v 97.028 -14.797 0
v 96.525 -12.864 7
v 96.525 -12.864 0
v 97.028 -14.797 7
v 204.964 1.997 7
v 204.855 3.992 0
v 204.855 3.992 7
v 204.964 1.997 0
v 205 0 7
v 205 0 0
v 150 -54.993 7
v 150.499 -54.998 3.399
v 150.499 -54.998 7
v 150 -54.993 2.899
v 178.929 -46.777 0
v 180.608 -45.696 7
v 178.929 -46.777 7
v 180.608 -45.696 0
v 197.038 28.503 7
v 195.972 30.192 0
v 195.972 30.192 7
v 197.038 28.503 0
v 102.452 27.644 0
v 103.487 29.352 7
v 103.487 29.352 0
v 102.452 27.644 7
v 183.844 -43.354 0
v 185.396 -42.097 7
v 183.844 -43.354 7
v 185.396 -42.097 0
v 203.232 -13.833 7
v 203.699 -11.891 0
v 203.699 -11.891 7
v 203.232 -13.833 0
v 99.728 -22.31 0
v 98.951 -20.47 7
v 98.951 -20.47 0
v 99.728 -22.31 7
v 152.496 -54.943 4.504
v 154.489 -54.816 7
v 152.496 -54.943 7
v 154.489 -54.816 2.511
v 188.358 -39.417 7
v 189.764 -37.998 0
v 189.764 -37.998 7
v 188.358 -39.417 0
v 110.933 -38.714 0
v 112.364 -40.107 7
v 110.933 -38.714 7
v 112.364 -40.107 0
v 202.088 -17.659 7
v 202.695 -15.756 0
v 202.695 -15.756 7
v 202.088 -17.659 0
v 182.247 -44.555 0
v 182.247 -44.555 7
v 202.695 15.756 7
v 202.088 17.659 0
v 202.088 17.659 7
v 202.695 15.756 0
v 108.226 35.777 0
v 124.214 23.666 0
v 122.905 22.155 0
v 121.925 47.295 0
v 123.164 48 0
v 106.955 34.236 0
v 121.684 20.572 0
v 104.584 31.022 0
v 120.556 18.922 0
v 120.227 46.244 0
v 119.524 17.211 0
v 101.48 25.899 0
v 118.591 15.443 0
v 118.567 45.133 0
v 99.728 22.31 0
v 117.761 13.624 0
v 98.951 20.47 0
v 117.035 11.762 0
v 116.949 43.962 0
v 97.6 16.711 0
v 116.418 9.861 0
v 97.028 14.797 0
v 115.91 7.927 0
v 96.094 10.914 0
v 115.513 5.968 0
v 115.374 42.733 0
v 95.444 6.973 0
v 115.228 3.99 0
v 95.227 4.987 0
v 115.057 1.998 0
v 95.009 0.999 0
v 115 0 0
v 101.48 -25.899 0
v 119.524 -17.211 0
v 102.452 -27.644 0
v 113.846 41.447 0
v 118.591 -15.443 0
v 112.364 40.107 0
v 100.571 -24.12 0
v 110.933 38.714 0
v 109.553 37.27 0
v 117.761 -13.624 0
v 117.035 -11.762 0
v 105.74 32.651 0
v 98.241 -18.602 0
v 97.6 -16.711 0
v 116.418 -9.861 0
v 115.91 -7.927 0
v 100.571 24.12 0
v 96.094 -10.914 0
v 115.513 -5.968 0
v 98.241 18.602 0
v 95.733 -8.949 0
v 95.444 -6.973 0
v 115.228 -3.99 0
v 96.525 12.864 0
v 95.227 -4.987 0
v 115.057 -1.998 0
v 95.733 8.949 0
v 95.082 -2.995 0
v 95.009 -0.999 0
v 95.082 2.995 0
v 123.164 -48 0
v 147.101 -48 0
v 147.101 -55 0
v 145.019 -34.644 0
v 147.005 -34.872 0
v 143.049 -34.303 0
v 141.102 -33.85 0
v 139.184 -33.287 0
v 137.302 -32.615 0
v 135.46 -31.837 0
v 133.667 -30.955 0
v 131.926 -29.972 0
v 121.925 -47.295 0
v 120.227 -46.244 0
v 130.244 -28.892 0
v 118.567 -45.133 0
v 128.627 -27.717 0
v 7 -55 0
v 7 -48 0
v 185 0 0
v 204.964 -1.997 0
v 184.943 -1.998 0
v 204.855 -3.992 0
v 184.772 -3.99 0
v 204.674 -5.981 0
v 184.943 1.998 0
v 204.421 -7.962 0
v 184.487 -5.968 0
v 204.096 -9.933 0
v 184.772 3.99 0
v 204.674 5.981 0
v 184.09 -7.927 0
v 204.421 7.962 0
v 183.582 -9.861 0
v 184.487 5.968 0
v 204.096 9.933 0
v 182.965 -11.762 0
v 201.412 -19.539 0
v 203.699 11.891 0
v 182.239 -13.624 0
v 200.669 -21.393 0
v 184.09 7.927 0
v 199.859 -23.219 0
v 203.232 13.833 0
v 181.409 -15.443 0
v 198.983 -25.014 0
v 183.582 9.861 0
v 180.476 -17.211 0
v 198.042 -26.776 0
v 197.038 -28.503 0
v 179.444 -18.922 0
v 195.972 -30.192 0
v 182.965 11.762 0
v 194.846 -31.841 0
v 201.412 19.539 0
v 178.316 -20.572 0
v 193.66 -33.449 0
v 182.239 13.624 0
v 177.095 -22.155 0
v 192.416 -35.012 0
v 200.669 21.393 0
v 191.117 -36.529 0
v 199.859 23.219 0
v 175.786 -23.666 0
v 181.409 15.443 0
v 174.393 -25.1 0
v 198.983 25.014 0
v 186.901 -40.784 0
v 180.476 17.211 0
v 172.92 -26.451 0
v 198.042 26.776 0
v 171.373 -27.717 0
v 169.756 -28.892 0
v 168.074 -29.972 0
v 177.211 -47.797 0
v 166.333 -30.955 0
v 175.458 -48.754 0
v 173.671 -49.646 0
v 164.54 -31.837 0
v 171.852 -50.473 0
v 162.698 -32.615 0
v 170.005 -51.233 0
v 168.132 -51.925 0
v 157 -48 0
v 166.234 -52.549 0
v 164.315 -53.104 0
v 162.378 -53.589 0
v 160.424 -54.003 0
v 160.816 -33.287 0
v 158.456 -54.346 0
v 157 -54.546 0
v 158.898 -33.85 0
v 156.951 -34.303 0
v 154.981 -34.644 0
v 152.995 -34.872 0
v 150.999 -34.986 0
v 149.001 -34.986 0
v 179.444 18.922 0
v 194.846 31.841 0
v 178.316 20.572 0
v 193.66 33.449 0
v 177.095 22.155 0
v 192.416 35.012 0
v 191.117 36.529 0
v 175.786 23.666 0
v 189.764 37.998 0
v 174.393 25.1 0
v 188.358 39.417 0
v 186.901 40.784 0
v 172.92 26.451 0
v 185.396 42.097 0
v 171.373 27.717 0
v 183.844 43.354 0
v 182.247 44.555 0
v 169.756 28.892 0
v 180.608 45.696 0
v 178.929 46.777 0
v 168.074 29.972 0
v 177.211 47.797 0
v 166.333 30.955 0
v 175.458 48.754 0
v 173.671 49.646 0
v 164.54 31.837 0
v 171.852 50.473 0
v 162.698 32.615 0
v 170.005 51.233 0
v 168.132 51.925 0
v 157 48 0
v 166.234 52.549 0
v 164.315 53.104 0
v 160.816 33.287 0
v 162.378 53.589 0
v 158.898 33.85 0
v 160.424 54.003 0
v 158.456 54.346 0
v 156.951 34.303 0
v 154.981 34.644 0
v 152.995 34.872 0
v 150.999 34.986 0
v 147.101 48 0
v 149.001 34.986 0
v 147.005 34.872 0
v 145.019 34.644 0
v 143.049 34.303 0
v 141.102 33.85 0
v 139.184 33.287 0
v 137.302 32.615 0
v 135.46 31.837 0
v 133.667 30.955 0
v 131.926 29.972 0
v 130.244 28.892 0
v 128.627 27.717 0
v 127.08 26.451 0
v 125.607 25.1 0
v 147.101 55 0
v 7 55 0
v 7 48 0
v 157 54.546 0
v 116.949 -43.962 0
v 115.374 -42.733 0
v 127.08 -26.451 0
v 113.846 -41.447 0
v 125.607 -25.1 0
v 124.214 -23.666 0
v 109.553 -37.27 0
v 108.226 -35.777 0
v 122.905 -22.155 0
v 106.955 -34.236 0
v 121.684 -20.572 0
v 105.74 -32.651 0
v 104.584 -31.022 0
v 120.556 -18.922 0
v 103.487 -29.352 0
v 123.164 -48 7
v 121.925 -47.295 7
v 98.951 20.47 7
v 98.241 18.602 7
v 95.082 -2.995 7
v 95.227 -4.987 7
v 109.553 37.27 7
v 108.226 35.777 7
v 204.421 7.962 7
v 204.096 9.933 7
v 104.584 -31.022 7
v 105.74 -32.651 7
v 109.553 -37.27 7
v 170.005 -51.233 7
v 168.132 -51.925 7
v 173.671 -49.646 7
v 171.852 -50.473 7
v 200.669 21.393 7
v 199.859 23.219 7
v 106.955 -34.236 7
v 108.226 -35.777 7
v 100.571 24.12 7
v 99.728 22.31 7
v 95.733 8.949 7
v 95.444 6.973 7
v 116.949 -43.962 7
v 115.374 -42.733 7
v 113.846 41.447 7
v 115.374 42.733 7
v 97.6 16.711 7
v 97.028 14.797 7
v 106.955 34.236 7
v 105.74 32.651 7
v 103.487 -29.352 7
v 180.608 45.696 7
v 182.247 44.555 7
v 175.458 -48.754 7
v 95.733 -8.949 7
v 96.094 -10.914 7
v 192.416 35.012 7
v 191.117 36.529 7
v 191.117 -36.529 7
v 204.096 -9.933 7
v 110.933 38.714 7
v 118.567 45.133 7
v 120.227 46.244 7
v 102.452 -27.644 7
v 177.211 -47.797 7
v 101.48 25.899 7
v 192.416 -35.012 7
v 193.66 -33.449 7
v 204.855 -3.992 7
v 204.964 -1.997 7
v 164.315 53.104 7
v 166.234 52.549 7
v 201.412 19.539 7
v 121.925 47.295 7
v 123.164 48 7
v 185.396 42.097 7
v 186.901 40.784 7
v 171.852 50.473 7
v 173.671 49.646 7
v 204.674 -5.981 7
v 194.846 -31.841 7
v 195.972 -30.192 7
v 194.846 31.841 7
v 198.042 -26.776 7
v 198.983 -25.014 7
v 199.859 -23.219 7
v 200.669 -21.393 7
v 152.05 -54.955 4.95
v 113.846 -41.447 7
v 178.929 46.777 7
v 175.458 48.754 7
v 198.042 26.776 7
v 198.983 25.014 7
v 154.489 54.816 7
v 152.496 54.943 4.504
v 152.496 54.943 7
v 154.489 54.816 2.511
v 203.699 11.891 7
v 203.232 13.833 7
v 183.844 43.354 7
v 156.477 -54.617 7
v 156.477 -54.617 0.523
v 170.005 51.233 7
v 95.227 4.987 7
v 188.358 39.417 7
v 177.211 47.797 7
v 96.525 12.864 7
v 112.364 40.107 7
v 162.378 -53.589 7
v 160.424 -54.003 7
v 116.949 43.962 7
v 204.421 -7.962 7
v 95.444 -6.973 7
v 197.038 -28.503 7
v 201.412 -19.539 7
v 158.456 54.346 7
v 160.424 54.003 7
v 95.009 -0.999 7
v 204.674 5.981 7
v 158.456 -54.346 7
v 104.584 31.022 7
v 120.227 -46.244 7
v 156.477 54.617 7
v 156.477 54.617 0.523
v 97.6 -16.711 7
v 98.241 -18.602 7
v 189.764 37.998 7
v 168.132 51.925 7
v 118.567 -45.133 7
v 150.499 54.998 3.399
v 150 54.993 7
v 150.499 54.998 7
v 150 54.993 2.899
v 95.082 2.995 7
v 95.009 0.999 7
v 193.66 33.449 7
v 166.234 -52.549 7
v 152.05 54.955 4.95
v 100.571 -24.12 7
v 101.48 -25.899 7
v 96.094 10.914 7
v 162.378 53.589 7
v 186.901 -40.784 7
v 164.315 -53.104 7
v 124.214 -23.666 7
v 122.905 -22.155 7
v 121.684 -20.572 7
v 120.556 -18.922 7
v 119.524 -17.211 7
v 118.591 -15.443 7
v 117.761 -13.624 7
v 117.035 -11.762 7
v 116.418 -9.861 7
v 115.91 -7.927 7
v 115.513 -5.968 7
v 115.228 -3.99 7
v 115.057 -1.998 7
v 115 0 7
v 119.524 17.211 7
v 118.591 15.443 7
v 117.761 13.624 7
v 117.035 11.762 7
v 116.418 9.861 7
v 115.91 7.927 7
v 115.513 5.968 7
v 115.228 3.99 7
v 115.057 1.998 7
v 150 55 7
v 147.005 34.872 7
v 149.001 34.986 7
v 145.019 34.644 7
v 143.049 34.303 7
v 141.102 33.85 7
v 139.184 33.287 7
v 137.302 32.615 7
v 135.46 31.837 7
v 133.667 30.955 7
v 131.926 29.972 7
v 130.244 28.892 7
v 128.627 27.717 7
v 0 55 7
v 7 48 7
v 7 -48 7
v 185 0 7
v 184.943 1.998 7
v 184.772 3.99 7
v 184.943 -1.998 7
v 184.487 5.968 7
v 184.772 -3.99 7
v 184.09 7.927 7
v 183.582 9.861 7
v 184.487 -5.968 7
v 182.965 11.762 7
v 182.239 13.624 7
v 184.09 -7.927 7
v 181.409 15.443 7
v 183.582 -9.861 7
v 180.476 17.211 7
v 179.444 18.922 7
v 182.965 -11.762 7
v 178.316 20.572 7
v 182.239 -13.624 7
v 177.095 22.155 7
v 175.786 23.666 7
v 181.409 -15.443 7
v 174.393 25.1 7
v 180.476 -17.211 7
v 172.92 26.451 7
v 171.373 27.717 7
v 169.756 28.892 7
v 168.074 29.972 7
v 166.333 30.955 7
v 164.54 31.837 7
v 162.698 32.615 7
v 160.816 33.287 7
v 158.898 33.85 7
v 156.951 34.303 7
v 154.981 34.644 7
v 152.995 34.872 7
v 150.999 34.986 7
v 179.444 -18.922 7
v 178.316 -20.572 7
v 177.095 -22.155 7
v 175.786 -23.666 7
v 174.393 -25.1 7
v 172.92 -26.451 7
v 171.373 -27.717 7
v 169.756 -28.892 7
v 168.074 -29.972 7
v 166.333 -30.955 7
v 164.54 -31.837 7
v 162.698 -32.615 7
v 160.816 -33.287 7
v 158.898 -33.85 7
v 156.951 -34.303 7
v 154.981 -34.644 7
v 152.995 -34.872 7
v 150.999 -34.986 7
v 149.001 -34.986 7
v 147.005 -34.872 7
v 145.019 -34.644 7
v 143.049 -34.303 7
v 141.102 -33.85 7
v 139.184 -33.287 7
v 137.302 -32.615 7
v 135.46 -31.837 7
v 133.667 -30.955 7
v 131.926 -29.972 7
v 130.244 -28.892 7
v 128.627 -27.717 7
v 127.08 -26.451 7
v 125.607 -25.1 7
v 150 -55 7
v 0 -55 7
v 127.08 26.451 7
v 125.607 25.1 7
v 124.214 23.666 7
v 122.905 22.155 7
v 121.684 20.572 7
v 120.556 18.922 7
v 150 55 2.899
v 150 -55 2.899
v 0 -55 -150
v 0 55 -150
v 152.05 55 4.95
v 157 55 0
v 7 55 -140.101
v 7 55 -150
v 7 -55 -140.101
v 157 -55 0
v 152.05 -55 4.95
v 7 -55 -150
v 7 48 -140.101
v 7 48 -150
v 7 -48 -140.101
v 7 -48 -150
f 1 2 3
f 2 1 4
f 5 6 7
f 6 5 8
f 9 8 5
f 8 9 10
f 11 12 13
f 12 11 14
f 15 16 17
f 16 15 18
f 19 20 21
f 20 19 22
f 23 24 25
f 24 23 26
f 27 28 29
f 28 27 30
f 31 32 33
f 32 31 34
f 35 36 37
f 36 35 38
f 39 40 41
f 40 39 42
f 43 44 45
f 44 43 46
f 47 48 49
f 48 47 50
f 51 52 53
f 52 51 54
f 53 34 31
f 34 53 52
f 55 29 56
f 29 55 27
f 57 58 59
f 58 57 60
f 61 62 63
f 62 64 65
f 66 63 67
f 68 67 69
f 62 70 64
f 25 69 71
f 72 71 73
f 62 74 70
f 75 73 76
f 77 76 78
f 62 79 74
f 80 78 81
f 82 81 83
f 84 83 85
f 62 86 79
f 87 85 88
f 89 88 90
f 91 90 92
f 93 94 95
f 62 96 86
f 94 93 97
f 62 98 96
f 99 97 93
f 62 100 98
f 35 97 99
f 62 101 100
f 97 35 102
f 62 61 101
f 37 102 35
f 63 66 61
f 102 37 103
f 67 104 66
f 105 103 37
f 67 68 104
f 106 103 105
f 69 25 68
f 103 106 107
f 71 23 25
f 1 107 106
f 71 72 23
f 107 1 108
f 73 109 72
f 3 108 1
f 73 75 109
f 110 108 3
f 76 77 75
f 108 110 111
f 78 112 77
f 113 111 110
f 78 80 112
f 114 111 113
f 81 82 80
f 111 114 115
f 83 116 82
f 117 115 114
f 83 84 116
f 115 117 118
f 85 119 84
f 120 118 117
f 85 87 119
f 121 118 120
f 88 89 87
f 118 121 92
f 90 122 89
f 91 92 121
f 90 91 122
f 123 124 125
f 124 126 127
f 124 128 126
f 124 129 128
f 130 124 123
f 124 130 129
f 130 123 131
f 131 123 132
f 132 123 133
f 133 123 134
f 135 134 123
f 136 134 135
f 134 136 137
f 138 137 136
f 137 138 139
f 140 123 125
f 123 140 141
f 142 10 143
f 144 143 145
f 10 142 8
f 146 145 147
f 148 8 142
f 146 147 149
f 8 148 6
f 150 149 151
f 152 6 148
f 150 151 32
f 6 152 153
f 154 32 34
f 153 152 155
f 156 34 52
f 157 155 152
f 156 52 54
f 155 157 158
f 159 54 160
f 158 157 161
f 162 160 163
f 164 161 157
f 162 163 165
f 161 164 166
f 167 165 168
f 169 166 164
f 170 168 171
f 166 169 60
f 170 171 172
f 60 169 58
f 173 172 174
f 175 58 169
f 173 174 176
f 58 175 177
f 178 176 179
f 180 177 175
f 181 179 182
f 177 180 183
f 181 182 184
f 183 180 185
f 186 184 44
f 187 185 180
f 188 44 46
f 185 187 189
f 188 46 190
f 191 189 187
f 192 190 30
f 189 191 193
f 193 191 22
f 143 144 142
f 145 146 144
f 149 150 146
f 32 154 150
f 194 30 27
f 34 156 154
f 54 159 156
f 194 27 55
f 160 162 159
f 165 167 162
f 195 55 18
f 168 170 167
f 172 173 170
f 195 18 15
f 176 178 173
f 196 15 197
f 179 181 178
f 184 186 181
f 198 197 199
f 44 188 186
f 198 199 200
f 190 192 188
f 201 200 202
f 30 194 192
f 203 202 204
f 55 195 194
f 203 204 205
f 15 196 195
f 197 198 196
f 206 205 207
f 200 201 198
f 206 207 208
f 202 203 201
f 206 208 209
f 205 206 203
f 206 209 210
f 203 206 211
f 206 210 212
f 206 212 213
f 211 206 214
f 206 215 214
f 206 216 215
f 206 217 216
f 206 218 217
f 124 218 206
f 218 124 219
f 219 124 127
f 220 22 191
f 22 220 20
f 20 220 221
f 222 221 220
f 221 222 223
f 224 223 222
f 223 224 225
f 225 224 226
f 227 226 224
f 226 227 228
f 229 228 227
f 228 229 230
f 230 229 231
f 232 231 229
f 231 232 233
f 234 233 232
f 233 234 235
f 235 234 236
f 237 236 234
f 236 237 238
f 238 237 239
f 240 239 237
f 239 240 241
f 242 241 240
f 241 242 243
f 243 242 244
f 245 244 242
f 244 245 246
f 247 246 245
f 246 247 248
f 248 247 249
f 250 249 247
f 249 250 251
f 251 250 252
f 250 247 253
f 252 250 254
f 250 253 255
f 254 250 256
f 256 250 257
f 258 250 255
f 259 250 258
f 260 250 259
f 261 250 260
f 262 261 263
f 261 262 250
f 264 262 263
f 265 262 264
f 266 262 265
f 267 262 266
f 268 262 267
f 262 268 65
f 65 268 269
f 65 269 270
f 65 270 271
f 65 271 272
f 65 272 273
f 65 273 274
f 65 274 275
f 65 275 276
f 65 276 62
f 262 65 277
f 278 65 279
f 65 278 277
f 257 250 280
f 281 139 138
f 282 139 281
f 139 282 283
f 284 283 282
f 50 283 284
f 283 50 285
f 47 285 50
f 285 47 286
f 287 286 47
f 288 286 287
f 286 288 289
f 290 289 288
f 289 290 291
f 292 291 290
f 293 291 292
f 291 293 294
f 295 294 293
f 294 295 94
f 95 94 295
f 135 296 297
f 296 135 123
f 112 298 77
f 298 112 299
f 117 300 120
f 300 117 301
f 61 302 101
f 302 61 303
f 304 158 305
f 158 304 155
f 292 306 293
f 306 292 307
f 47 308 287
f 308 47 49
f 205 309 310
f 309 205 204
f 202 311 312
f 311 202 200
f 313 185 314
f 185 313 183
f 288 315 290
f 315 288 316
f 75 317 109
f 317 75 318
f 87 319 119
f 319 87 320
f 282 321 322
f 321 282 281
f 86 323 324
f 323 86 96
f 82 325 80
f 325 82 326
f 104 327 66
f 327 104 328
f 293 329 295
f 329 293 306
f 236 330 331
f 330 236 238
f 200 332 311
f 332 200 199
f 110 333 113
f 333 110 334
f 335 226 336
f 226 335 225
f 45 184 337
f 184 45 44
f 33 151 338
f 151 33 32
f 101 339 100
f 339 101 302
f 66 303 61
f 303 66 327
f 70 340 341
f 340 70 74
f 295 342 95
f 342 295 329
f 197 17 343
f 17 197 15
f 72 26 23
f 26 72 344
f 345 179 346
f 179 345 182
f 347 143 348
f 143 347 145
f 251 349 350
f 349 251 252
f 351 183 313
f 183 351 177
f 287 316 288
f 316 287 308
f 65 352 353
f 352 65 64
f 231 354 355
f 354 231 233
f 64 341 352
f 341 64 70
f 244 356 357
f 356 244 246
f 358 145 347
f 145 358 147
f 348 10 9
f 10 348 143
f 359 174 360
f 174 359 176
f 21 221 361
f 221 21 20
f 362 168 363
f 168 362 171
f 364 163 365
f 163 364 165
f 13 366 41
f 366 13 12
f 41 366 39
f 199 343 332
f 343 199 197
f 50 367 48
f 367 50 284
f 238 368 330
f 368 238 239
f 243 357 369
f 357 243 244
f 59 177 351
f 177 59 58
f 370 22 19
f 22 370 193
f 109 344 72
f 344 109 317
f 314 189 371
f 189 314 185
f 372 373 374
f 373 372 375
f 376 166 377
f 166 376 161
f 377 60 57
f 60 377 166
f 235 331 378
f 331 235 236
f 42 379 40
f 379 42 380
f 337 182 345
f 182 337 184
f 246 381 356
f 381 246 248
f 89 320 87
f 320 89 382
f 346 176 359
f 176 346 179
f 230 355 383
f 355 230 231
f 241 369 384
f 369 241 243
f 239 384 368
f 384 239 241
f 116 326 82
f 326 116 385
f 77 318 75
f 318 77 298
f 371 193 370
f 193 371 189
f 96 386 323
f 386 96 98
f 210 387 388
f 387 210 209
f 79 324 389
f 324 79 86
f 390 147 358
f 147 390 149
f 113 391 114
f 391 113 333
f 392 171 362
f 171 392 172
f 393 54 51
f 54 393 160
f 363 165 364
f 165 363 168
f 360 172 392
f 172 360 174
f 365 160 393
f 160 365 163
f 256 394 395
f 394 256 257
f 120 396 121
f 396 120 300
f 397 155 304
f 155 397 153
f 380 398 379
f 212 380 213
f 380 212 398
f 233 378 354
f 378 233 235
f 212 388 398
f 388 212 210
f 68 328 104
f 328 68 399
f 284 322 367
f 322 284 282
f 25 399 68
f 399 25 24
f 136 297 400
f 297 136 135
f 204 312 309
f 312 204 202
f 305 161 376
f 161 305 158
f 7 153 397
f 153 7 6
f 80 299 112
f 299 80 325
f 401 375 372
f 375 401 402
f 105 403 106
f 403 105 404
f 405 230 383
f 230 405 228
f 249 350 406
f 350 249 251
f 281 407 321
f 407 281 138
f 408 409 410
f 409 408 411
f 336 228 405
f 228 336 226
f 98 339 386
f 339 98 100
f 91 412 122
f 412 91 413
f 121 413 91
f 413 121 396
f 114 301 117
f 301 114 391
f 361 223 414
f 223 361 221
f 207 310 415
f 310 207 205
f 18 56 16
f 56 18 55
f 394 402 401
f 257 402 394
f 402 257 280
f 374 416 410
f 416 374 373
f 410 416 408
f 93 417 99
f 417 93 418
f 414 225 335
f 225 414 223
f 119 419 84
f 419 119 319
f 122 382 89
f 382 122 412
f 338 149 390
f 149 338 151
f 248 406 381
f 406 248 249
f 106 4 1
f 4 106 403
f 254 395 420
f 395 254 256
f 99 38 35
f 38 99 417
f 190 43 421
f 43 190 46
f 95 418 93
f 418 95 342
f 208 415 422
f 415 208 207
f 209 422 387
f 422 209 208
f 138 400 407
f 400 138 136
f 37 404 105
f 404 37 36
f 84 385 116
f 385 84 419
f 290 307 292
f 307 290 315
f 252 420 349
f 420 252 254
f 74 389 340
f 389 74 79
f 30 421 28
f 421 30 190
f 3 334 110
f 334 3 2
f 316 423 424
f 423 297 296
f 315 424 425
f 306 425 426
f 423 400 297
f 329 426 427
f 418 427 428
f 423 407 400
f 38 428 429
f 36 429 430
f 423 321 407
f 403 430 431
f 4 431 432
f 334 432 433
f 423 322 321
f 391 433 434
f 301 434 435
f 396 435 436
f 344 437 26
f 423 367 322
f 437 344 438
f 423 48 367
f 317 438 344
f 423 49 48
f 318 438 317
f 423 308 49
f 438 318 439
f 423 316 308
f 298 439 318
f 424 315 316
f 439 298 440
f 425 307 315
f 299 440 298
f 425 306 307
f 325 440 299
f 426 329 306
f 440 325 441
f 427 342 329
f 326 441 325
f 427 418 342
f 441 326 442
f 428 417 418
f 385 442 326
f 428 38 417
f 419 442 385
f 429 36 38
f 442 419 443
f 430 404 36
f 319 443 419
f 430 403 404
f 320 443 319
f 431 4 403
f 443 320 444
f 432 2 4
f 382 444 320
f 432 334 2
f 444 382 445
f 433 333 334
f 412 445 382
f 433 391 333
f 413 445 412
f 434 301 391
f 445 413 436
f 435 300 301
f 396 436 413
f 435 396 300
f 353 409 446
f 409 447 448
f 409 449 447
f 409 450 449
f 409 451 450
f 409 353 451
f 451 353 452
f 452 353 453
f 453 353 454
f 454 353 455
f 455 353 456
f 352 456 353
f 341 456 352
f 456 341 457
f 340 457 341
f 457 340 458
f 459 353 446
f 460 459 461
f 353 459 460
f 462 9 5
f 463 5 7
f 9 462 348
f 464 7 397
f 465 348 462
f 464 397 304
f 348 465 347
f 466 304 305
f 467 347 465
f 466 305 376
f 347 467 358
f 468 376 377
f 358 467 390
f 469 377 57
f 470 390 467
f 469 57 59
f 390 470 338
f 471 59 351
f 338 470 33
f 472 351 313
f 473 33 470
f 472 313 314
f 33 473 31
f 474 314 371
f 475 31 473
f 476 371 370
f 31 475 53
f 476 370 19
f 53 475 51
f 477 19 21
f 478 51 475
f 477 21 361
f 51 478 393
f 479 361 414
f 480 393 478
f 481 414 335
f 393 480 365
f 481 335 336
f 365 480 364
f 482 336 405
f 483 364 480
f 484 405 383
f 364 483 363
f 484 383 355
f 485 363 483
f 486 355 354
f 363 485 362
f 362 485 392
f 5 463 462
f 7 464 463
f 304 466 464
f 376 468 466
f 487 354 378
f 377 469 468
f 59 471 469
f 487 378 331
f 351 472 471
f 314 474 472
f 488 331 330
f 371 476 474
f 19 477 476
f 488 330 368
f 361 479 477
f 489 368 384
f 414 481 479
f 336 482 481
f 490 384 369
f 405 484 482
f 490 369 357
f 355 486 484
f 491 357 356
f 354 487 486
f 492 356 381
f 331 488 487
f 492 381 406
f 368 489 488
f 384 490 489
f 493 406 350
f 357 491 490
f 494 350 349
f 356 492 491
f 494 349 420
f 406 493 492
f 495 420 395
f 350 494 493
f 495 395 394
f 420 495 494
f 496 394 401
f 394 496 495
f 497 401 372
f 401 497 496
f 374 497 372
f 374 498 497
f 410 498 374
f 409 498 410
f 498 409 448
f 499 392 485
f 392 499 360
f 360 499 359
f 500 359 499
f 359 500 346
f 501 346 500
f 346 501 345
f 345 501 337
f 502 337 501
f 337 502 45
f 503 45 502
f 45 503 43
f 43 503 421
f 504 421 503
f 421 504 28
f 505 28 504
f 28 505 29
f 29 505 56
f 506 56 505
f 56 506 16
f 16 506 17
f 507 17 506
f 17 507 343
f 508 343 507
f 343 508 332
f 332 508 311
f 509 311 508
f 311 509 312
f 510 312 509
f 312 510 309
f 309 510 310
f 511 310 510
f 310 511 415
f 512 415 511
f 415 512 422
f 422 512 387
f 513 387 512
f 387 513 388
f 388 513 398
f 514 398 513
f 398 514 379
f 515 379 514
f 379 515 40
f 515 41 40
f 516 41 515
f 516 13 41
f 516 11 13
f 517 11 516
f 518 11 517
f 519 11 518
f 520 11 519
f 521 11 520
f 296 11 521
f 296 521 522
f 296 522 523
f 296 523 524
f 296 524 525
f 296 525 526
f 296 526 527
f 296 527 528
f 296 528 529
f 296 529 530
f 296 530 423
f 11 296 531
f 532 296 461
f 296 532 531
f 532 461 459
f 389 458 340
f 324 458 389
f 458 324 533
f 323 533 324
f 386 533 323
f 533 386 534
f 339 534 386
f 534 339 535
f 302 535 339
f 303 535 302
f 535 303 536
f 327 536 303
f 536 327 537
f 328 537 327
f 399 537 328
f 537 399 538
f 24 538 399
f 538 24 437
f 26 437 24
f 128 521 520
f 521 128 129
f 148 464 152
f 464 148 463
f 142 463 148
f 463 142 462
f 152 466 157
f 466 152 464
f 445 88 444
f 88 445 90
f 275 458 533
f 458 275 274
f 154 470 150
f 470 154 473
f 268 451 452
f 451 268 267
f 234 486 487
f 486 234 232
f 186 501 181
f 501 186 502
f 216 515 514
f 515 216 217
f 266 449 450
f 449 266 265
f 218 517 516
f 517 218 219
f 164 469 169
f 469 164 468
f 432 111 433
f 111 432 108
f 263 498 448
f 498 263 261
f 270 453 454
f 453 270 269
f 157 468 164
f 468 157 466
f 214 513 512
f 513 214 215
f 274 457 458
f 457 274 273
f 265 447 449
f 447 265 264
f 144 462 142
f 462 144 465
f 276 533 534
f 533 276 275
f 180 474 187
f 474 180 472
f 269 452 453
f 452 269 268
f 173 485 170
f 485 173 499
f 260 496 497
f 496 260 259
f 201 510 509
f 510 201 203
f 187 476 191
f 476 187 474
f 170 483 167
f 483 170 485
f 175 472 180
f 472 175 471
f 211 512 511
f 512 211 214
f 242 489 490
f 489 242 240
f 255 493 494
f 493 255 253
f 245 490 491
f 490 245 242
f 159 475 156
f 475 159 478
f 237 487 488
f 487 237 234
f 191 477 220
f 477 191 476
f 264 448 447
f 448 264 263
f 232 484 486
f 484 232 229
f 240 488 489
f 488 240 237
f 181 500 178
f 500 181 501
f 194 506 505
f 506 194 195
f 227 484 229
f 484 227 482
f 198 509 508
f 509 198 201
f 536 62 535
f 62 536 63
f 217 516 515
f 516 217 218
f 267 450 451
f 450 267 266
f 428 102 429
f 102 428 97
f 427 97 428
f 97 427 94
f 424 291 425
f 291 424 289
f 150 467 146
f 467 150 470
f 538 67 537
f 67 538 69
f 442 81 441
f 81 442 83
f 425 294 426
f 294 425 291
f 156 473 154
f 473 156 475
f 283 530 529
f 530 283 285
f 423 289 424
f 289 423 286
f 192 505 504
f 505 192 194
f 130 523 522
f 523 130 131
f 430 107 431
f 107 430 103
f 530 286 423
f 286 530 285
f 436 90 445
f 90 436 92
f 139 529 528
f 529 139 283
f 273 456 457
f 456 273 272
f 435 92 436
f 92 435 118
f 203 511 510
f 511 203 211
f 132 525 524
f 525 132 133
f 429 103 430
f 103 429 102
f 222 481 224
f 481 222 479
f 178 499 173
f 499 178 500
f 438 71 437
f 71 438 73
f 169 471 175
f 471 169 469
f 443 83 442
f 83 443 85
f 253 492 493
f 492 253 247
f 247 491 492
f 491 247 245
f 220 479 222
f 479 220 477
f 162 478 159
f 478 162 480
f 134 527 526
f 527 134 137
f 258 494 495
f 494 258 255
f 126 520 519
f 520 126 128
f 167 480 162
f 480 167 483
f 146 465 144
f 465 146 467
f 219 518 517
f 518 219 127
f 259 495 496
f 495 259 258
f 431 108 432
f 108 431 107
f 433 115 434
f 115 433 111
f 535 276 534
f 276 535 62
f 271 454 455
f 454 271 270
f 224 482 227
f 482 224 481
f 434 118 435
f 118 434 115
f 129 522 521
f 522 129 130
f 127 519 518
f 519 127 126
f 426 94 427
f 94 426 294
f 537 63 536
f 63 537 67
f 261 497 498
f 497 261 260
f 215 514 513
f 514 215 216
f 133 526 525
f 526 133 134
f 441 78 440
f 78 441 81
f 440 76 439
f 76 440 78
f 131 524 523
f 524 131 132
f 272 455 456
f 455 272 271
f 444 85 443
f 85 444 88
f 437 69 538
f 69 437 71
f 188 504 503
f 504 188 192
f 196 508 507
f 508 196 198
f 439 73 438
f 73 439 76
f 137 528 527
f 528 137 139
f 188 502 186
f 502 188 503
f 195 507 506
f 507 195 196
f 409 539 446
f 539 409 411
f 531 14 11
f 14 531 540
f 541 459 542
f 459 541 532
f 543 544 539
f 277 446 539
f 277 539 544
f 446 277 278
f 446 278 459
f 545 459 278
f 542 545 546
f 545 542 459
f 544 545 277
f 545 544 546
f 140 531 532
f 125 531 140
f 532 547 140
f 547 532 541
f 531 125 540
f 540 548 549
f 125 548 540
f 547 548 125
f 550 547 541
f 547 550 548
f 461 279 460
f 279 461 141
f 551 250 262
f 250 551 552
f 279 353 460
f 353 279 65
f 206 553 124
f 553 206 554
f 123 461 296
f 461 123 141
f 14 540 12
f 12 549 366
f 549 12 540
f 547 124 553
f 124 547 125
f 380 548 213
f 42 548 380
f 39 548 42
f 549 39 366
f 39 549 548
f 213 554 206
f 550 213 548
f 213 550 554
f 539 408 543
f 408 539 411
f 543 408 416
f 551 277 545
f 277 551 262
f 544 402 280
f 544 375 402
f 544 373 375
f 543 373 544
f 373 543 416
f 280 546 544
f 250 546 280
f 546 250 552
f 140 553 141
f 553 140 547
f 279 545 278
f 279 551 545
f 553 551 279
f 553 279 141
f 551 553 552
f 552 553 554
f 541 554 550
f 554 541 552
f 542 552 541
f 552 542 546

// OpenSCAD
diameter = 110;
length = 150;
height = 150;
thickness = 7;
angle = 4;
width = 20;

module strut()
{
    translate([0,0,-height])
    rotate([0,-45,0])
    {
        cube([sqrt(length*length + height*height), thickness, thickness]);
    }
};

union()
{
    translate([length,0,0])
    {
        difference()
        {
            cylinder($fa = 1, d = diameter, h = thickness);
            translate([0,0,-1])
            {
                cylinder($fa = 1, d = diameter-(2*width), h = thickness+2);
            }
        }
    };


    translate([0,-diameter/2,0])
    {
        difference()
        {
            cube([length, diameter, thickness]);
            translate([thickness,thickness,-1])
            {
                cube([length - thickness + 2, diameter - 2*thickness, thickness + 2]);
            }
        }
    };

    translate([thickness,-diameter/2,0])
    {
        strut();
    };

    translate([thickness,diameter/2-thickness,0])
    {
        strut();
    };

    translate([0, -diameter/2, -height])
    {
        cube([thickness,diameter,height]);
    };

}
